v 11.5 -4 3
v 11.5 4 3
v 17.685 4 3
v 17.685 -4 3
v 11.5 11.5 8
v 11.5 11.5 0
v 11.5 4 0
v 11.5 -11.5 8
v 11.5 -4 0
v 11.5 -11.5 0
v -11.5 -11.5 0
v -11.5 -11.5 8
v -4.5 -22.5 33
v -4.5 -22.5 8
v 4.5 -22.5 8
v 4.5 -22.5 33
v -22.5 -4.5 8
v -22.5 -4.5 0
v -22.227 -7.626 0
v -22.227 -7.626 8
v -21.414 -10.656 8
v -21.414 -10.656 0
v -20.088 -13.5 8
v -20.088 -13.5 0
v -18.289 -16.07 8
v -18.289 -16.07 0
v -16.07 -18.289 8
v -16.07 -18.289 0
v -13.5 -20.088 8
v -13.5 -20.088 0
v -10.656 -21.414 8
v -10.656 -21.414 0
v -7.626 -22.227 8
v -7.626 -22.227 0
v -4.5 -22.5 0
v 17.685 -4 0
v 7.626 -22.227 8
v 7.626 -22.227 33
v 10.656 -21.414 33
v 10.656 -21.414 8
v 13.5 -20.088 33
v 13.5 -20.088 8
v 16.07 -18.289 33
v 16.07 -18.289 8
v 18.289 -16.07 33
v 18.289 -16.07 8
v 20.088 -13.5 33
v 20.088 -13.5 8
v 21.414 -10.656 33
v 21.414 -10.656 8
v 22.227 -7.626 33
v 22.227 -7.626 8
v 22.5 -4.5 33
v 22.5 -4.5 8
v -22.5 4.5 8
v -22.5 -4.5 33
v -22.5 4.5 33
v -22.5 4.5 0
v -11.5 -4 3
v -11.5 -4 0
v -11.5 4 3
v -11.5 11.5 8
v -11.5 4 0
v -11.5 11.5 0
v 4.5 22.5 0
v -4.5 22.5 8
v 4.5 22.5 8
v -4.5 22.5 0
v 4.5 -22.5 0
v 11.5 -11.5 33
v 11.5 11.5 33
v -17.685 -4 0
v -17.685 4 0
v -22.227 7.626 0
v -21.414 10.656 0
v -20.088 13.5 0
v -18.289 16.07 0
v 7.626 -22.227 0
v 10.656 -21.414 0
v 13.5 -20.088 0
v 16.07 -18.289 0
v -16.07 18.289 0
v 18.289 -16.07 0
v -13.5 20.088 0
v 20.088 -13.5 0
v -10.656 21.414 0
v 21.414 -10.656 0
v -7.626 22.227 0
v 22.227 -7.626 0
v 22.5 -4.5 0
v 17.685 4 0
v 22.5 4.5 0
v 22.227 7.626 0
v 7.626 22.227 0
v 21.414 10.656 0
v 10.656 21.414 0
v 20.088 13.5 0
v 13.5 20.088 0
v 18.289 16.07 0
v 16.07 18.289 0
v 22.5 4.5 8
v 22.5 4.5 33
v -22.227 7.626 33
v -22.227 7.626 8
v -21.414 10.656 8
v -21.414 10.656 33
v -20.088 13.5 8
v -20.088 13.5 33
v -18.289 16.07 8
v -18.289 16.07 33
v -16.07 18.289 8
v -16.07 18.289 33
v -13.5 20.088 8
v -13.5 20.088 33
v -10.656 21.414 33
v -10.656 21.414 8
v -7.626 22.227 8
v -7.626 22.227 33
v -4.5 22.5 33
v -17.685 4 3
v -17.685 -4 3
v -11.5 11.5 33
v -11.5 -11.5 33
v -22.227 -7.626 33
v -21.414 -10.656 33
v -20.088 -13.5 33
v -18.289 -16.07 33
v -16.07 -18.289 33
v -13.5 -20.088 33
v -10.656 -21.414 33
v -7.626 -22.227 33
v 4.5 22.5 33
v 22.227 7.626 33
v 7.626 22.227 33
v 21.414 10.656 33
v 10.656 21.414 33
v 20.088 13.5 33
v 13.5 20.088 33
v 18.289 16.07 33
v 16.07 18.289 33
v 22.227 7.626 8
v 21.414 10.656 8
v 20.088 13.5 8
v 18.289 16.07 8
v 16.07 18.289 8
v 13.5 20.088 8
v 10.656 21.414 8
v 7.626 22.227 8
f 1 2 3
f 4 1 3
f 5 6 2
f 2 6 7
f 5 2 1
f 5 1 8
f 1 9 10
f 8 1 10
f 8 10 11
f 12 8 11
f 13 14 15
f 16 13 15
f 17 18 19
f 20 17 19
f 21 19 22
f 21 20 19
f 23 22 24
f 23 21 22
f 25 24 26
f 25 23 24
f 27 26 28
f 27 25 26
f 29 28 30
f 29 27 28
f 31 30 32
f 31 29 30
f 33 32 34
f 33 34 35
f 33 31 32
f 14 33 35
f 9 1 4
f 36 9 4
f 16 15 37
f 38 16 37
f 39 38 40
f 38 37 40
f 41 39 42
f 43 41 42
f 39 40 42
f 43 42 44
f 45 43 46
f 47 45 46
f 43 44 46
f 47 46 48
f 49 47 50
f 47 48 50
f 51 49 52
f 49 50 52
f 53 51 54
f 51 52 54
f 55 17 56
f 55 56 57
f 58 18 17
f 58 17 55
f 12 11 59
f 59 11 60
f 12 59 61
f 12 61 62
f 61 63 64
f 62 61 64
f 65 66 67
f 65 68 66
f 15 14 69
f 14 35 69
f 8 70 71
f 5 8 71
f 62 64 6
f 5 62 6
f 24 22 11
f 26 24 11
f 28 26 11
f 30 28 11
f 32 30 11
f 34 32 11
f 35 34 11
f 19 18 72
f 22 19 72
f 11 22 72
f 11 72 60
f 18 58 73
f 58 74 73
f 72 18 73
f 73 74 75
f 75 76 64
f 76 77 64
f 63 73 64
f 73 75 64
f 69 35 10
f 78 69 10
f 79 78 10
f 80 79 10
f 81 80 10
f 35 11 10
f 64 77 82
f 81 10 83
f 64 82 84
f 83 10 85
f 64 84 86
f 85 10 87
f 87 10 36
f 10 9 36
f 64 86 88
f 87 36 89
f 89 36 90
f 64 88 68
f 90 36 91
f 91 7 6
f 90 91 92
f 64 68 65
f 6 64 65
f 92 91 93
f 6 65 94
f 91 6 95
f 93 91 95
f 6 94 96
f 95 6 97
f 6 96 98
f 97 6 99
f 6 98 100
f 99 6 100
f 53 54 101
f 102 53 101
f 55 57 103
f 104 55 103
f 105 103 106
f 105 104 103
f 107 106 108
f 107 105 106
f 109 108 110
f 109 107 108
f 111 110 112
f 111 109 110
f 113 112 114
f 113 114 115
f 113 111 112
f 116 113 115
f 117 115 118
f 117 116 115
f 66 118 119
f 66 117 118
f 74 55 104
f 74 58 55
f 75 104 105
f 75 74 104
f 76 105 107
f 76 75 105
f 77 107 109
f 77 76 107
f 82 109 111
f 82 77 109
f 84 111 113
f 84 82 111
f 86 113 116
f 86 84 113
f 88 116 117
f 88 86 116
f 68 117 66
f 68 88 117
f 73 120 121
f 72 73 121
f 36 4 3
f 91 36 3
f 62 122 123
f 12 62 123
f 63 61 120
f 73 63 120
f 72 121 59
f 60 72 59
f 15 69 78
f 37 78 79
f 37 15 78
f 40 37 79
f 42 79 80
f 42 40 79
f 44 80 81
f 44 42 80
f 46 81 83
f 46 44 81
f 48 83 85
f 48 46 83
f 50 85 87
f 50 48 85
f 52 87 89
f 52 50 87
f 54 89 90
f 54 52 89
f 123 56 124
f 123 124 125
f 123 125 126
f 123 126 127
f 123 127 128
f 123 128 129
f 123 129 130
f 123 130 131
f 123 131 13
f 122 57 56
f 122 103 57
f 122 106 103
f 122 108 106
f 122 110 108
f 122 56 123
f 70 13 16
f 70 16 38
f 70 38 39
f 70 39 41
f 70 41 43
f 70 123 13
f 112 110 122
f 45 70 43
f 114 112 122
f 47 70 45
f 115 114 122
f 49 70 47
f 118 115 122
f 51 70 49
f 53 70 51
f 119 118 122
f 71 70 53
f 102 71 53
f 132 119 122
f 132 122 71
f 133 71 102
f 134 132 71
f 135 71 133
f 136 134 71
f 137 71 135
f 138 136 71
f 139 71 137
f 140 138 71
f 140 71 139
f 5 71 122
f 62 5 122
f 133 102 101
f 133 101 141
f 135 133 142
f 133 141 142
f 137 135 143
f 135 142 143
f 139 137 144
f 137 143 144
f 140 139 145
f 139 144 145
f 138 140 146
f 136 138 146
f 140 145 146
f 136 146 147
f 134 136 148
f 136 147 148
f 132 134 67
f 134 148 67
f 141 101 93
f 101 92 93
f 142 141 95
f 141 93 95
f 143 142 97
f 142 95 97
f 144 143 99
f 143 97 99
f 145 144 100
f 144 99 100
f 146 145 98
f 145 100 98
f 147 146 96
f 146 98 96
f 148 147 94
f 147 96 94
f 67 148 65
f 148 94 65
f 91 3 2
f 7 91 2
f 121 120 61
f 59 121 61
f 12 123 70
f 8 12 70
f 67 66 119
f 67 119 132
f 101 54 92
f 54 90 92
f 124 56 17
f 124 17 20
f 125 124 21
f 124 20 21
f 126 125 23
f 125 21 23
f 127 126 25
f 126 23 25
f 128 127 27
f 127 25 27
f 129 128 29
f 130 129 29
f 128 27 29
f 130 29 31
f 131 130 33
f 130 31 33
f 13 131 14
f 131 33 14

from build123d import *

# Parameters (mm, degrees)
F0_W     = 45
F0_H     = 45
F1_DEPTH = 3
F3_DEPTH = 25
F4_W     = 45
F4_H     = 45
F5_DEPTH = 5
F7_DEPTH = 25
F8_R     = 18
F9_DEPTH = 25


with BuildPart() as f1:
    # F0 (on Top) → F1 (new body)
    with BuildSketch(Plane.XY):
        Rectangle(F0_W, F0_H)
    extrude(amount=F1_DEPTH)

    # F2 (on face) → F3 (cut)
    with BuildSketch(Plane.XY.offset(3)):
        Polygon((11.5, 11.5), (-11.5, 11.5), (-11.5, 4), (-17.6846776158, 4), (-17.6846776158, -4), (-11.5, -4), (-11.5, -11.5), (11.5, -11.5), (11.5, -4), (17.6846776158, -4), (17.6846776158, 4), (11.5, 4), align=None)
    extrude(amount=-F3_DEPTH, mode=Mode.SUBTRACT)

    # F4 (on face) → F5 (join)
    with BuildSketch(Plane.XY.offset(3)):
        Rectangle(F4_W, F4_H)
    extrude(amount=F5_DEPTH)

    # F6 (on face) → F7 (cut)
    with BuildSketch(Plane(origin=(0, 0, 3), x_dir=(1, 0, 0), z_dir=(0, 0, -1))):
        Polygon((11.5, -11.5), (11.5, -4), (11.5, 4), (11.5, 11.5), (-11.5, 11.5), (-11.5, 4), (-11.5, -4), (-11.5, -11.5), align=None)
    extrude(amount=-F7_DEPTH, mode=Mode.SUBTRACT)

    # F8
    f8_edges = [f1.edges().sort_by_distance(p)[0] for p in [
        (-22.5, -22.5, 4),
        (22.5, -22.5, 4),
        (22.5, 22.5, 4),
        (-22.5, 22.5, 4),
    ]]
    fillet(f8_edges, radius=F8_R)

    # F9 (add): a face of the model
    f9_faces = [f1.faces().sort_by_distance(p)[0] for p in [
        (0, 21.8636038969, 8),
    ]]
    extrude(f9_faces, amount=F9_DEPTH)


solid = f1.part
